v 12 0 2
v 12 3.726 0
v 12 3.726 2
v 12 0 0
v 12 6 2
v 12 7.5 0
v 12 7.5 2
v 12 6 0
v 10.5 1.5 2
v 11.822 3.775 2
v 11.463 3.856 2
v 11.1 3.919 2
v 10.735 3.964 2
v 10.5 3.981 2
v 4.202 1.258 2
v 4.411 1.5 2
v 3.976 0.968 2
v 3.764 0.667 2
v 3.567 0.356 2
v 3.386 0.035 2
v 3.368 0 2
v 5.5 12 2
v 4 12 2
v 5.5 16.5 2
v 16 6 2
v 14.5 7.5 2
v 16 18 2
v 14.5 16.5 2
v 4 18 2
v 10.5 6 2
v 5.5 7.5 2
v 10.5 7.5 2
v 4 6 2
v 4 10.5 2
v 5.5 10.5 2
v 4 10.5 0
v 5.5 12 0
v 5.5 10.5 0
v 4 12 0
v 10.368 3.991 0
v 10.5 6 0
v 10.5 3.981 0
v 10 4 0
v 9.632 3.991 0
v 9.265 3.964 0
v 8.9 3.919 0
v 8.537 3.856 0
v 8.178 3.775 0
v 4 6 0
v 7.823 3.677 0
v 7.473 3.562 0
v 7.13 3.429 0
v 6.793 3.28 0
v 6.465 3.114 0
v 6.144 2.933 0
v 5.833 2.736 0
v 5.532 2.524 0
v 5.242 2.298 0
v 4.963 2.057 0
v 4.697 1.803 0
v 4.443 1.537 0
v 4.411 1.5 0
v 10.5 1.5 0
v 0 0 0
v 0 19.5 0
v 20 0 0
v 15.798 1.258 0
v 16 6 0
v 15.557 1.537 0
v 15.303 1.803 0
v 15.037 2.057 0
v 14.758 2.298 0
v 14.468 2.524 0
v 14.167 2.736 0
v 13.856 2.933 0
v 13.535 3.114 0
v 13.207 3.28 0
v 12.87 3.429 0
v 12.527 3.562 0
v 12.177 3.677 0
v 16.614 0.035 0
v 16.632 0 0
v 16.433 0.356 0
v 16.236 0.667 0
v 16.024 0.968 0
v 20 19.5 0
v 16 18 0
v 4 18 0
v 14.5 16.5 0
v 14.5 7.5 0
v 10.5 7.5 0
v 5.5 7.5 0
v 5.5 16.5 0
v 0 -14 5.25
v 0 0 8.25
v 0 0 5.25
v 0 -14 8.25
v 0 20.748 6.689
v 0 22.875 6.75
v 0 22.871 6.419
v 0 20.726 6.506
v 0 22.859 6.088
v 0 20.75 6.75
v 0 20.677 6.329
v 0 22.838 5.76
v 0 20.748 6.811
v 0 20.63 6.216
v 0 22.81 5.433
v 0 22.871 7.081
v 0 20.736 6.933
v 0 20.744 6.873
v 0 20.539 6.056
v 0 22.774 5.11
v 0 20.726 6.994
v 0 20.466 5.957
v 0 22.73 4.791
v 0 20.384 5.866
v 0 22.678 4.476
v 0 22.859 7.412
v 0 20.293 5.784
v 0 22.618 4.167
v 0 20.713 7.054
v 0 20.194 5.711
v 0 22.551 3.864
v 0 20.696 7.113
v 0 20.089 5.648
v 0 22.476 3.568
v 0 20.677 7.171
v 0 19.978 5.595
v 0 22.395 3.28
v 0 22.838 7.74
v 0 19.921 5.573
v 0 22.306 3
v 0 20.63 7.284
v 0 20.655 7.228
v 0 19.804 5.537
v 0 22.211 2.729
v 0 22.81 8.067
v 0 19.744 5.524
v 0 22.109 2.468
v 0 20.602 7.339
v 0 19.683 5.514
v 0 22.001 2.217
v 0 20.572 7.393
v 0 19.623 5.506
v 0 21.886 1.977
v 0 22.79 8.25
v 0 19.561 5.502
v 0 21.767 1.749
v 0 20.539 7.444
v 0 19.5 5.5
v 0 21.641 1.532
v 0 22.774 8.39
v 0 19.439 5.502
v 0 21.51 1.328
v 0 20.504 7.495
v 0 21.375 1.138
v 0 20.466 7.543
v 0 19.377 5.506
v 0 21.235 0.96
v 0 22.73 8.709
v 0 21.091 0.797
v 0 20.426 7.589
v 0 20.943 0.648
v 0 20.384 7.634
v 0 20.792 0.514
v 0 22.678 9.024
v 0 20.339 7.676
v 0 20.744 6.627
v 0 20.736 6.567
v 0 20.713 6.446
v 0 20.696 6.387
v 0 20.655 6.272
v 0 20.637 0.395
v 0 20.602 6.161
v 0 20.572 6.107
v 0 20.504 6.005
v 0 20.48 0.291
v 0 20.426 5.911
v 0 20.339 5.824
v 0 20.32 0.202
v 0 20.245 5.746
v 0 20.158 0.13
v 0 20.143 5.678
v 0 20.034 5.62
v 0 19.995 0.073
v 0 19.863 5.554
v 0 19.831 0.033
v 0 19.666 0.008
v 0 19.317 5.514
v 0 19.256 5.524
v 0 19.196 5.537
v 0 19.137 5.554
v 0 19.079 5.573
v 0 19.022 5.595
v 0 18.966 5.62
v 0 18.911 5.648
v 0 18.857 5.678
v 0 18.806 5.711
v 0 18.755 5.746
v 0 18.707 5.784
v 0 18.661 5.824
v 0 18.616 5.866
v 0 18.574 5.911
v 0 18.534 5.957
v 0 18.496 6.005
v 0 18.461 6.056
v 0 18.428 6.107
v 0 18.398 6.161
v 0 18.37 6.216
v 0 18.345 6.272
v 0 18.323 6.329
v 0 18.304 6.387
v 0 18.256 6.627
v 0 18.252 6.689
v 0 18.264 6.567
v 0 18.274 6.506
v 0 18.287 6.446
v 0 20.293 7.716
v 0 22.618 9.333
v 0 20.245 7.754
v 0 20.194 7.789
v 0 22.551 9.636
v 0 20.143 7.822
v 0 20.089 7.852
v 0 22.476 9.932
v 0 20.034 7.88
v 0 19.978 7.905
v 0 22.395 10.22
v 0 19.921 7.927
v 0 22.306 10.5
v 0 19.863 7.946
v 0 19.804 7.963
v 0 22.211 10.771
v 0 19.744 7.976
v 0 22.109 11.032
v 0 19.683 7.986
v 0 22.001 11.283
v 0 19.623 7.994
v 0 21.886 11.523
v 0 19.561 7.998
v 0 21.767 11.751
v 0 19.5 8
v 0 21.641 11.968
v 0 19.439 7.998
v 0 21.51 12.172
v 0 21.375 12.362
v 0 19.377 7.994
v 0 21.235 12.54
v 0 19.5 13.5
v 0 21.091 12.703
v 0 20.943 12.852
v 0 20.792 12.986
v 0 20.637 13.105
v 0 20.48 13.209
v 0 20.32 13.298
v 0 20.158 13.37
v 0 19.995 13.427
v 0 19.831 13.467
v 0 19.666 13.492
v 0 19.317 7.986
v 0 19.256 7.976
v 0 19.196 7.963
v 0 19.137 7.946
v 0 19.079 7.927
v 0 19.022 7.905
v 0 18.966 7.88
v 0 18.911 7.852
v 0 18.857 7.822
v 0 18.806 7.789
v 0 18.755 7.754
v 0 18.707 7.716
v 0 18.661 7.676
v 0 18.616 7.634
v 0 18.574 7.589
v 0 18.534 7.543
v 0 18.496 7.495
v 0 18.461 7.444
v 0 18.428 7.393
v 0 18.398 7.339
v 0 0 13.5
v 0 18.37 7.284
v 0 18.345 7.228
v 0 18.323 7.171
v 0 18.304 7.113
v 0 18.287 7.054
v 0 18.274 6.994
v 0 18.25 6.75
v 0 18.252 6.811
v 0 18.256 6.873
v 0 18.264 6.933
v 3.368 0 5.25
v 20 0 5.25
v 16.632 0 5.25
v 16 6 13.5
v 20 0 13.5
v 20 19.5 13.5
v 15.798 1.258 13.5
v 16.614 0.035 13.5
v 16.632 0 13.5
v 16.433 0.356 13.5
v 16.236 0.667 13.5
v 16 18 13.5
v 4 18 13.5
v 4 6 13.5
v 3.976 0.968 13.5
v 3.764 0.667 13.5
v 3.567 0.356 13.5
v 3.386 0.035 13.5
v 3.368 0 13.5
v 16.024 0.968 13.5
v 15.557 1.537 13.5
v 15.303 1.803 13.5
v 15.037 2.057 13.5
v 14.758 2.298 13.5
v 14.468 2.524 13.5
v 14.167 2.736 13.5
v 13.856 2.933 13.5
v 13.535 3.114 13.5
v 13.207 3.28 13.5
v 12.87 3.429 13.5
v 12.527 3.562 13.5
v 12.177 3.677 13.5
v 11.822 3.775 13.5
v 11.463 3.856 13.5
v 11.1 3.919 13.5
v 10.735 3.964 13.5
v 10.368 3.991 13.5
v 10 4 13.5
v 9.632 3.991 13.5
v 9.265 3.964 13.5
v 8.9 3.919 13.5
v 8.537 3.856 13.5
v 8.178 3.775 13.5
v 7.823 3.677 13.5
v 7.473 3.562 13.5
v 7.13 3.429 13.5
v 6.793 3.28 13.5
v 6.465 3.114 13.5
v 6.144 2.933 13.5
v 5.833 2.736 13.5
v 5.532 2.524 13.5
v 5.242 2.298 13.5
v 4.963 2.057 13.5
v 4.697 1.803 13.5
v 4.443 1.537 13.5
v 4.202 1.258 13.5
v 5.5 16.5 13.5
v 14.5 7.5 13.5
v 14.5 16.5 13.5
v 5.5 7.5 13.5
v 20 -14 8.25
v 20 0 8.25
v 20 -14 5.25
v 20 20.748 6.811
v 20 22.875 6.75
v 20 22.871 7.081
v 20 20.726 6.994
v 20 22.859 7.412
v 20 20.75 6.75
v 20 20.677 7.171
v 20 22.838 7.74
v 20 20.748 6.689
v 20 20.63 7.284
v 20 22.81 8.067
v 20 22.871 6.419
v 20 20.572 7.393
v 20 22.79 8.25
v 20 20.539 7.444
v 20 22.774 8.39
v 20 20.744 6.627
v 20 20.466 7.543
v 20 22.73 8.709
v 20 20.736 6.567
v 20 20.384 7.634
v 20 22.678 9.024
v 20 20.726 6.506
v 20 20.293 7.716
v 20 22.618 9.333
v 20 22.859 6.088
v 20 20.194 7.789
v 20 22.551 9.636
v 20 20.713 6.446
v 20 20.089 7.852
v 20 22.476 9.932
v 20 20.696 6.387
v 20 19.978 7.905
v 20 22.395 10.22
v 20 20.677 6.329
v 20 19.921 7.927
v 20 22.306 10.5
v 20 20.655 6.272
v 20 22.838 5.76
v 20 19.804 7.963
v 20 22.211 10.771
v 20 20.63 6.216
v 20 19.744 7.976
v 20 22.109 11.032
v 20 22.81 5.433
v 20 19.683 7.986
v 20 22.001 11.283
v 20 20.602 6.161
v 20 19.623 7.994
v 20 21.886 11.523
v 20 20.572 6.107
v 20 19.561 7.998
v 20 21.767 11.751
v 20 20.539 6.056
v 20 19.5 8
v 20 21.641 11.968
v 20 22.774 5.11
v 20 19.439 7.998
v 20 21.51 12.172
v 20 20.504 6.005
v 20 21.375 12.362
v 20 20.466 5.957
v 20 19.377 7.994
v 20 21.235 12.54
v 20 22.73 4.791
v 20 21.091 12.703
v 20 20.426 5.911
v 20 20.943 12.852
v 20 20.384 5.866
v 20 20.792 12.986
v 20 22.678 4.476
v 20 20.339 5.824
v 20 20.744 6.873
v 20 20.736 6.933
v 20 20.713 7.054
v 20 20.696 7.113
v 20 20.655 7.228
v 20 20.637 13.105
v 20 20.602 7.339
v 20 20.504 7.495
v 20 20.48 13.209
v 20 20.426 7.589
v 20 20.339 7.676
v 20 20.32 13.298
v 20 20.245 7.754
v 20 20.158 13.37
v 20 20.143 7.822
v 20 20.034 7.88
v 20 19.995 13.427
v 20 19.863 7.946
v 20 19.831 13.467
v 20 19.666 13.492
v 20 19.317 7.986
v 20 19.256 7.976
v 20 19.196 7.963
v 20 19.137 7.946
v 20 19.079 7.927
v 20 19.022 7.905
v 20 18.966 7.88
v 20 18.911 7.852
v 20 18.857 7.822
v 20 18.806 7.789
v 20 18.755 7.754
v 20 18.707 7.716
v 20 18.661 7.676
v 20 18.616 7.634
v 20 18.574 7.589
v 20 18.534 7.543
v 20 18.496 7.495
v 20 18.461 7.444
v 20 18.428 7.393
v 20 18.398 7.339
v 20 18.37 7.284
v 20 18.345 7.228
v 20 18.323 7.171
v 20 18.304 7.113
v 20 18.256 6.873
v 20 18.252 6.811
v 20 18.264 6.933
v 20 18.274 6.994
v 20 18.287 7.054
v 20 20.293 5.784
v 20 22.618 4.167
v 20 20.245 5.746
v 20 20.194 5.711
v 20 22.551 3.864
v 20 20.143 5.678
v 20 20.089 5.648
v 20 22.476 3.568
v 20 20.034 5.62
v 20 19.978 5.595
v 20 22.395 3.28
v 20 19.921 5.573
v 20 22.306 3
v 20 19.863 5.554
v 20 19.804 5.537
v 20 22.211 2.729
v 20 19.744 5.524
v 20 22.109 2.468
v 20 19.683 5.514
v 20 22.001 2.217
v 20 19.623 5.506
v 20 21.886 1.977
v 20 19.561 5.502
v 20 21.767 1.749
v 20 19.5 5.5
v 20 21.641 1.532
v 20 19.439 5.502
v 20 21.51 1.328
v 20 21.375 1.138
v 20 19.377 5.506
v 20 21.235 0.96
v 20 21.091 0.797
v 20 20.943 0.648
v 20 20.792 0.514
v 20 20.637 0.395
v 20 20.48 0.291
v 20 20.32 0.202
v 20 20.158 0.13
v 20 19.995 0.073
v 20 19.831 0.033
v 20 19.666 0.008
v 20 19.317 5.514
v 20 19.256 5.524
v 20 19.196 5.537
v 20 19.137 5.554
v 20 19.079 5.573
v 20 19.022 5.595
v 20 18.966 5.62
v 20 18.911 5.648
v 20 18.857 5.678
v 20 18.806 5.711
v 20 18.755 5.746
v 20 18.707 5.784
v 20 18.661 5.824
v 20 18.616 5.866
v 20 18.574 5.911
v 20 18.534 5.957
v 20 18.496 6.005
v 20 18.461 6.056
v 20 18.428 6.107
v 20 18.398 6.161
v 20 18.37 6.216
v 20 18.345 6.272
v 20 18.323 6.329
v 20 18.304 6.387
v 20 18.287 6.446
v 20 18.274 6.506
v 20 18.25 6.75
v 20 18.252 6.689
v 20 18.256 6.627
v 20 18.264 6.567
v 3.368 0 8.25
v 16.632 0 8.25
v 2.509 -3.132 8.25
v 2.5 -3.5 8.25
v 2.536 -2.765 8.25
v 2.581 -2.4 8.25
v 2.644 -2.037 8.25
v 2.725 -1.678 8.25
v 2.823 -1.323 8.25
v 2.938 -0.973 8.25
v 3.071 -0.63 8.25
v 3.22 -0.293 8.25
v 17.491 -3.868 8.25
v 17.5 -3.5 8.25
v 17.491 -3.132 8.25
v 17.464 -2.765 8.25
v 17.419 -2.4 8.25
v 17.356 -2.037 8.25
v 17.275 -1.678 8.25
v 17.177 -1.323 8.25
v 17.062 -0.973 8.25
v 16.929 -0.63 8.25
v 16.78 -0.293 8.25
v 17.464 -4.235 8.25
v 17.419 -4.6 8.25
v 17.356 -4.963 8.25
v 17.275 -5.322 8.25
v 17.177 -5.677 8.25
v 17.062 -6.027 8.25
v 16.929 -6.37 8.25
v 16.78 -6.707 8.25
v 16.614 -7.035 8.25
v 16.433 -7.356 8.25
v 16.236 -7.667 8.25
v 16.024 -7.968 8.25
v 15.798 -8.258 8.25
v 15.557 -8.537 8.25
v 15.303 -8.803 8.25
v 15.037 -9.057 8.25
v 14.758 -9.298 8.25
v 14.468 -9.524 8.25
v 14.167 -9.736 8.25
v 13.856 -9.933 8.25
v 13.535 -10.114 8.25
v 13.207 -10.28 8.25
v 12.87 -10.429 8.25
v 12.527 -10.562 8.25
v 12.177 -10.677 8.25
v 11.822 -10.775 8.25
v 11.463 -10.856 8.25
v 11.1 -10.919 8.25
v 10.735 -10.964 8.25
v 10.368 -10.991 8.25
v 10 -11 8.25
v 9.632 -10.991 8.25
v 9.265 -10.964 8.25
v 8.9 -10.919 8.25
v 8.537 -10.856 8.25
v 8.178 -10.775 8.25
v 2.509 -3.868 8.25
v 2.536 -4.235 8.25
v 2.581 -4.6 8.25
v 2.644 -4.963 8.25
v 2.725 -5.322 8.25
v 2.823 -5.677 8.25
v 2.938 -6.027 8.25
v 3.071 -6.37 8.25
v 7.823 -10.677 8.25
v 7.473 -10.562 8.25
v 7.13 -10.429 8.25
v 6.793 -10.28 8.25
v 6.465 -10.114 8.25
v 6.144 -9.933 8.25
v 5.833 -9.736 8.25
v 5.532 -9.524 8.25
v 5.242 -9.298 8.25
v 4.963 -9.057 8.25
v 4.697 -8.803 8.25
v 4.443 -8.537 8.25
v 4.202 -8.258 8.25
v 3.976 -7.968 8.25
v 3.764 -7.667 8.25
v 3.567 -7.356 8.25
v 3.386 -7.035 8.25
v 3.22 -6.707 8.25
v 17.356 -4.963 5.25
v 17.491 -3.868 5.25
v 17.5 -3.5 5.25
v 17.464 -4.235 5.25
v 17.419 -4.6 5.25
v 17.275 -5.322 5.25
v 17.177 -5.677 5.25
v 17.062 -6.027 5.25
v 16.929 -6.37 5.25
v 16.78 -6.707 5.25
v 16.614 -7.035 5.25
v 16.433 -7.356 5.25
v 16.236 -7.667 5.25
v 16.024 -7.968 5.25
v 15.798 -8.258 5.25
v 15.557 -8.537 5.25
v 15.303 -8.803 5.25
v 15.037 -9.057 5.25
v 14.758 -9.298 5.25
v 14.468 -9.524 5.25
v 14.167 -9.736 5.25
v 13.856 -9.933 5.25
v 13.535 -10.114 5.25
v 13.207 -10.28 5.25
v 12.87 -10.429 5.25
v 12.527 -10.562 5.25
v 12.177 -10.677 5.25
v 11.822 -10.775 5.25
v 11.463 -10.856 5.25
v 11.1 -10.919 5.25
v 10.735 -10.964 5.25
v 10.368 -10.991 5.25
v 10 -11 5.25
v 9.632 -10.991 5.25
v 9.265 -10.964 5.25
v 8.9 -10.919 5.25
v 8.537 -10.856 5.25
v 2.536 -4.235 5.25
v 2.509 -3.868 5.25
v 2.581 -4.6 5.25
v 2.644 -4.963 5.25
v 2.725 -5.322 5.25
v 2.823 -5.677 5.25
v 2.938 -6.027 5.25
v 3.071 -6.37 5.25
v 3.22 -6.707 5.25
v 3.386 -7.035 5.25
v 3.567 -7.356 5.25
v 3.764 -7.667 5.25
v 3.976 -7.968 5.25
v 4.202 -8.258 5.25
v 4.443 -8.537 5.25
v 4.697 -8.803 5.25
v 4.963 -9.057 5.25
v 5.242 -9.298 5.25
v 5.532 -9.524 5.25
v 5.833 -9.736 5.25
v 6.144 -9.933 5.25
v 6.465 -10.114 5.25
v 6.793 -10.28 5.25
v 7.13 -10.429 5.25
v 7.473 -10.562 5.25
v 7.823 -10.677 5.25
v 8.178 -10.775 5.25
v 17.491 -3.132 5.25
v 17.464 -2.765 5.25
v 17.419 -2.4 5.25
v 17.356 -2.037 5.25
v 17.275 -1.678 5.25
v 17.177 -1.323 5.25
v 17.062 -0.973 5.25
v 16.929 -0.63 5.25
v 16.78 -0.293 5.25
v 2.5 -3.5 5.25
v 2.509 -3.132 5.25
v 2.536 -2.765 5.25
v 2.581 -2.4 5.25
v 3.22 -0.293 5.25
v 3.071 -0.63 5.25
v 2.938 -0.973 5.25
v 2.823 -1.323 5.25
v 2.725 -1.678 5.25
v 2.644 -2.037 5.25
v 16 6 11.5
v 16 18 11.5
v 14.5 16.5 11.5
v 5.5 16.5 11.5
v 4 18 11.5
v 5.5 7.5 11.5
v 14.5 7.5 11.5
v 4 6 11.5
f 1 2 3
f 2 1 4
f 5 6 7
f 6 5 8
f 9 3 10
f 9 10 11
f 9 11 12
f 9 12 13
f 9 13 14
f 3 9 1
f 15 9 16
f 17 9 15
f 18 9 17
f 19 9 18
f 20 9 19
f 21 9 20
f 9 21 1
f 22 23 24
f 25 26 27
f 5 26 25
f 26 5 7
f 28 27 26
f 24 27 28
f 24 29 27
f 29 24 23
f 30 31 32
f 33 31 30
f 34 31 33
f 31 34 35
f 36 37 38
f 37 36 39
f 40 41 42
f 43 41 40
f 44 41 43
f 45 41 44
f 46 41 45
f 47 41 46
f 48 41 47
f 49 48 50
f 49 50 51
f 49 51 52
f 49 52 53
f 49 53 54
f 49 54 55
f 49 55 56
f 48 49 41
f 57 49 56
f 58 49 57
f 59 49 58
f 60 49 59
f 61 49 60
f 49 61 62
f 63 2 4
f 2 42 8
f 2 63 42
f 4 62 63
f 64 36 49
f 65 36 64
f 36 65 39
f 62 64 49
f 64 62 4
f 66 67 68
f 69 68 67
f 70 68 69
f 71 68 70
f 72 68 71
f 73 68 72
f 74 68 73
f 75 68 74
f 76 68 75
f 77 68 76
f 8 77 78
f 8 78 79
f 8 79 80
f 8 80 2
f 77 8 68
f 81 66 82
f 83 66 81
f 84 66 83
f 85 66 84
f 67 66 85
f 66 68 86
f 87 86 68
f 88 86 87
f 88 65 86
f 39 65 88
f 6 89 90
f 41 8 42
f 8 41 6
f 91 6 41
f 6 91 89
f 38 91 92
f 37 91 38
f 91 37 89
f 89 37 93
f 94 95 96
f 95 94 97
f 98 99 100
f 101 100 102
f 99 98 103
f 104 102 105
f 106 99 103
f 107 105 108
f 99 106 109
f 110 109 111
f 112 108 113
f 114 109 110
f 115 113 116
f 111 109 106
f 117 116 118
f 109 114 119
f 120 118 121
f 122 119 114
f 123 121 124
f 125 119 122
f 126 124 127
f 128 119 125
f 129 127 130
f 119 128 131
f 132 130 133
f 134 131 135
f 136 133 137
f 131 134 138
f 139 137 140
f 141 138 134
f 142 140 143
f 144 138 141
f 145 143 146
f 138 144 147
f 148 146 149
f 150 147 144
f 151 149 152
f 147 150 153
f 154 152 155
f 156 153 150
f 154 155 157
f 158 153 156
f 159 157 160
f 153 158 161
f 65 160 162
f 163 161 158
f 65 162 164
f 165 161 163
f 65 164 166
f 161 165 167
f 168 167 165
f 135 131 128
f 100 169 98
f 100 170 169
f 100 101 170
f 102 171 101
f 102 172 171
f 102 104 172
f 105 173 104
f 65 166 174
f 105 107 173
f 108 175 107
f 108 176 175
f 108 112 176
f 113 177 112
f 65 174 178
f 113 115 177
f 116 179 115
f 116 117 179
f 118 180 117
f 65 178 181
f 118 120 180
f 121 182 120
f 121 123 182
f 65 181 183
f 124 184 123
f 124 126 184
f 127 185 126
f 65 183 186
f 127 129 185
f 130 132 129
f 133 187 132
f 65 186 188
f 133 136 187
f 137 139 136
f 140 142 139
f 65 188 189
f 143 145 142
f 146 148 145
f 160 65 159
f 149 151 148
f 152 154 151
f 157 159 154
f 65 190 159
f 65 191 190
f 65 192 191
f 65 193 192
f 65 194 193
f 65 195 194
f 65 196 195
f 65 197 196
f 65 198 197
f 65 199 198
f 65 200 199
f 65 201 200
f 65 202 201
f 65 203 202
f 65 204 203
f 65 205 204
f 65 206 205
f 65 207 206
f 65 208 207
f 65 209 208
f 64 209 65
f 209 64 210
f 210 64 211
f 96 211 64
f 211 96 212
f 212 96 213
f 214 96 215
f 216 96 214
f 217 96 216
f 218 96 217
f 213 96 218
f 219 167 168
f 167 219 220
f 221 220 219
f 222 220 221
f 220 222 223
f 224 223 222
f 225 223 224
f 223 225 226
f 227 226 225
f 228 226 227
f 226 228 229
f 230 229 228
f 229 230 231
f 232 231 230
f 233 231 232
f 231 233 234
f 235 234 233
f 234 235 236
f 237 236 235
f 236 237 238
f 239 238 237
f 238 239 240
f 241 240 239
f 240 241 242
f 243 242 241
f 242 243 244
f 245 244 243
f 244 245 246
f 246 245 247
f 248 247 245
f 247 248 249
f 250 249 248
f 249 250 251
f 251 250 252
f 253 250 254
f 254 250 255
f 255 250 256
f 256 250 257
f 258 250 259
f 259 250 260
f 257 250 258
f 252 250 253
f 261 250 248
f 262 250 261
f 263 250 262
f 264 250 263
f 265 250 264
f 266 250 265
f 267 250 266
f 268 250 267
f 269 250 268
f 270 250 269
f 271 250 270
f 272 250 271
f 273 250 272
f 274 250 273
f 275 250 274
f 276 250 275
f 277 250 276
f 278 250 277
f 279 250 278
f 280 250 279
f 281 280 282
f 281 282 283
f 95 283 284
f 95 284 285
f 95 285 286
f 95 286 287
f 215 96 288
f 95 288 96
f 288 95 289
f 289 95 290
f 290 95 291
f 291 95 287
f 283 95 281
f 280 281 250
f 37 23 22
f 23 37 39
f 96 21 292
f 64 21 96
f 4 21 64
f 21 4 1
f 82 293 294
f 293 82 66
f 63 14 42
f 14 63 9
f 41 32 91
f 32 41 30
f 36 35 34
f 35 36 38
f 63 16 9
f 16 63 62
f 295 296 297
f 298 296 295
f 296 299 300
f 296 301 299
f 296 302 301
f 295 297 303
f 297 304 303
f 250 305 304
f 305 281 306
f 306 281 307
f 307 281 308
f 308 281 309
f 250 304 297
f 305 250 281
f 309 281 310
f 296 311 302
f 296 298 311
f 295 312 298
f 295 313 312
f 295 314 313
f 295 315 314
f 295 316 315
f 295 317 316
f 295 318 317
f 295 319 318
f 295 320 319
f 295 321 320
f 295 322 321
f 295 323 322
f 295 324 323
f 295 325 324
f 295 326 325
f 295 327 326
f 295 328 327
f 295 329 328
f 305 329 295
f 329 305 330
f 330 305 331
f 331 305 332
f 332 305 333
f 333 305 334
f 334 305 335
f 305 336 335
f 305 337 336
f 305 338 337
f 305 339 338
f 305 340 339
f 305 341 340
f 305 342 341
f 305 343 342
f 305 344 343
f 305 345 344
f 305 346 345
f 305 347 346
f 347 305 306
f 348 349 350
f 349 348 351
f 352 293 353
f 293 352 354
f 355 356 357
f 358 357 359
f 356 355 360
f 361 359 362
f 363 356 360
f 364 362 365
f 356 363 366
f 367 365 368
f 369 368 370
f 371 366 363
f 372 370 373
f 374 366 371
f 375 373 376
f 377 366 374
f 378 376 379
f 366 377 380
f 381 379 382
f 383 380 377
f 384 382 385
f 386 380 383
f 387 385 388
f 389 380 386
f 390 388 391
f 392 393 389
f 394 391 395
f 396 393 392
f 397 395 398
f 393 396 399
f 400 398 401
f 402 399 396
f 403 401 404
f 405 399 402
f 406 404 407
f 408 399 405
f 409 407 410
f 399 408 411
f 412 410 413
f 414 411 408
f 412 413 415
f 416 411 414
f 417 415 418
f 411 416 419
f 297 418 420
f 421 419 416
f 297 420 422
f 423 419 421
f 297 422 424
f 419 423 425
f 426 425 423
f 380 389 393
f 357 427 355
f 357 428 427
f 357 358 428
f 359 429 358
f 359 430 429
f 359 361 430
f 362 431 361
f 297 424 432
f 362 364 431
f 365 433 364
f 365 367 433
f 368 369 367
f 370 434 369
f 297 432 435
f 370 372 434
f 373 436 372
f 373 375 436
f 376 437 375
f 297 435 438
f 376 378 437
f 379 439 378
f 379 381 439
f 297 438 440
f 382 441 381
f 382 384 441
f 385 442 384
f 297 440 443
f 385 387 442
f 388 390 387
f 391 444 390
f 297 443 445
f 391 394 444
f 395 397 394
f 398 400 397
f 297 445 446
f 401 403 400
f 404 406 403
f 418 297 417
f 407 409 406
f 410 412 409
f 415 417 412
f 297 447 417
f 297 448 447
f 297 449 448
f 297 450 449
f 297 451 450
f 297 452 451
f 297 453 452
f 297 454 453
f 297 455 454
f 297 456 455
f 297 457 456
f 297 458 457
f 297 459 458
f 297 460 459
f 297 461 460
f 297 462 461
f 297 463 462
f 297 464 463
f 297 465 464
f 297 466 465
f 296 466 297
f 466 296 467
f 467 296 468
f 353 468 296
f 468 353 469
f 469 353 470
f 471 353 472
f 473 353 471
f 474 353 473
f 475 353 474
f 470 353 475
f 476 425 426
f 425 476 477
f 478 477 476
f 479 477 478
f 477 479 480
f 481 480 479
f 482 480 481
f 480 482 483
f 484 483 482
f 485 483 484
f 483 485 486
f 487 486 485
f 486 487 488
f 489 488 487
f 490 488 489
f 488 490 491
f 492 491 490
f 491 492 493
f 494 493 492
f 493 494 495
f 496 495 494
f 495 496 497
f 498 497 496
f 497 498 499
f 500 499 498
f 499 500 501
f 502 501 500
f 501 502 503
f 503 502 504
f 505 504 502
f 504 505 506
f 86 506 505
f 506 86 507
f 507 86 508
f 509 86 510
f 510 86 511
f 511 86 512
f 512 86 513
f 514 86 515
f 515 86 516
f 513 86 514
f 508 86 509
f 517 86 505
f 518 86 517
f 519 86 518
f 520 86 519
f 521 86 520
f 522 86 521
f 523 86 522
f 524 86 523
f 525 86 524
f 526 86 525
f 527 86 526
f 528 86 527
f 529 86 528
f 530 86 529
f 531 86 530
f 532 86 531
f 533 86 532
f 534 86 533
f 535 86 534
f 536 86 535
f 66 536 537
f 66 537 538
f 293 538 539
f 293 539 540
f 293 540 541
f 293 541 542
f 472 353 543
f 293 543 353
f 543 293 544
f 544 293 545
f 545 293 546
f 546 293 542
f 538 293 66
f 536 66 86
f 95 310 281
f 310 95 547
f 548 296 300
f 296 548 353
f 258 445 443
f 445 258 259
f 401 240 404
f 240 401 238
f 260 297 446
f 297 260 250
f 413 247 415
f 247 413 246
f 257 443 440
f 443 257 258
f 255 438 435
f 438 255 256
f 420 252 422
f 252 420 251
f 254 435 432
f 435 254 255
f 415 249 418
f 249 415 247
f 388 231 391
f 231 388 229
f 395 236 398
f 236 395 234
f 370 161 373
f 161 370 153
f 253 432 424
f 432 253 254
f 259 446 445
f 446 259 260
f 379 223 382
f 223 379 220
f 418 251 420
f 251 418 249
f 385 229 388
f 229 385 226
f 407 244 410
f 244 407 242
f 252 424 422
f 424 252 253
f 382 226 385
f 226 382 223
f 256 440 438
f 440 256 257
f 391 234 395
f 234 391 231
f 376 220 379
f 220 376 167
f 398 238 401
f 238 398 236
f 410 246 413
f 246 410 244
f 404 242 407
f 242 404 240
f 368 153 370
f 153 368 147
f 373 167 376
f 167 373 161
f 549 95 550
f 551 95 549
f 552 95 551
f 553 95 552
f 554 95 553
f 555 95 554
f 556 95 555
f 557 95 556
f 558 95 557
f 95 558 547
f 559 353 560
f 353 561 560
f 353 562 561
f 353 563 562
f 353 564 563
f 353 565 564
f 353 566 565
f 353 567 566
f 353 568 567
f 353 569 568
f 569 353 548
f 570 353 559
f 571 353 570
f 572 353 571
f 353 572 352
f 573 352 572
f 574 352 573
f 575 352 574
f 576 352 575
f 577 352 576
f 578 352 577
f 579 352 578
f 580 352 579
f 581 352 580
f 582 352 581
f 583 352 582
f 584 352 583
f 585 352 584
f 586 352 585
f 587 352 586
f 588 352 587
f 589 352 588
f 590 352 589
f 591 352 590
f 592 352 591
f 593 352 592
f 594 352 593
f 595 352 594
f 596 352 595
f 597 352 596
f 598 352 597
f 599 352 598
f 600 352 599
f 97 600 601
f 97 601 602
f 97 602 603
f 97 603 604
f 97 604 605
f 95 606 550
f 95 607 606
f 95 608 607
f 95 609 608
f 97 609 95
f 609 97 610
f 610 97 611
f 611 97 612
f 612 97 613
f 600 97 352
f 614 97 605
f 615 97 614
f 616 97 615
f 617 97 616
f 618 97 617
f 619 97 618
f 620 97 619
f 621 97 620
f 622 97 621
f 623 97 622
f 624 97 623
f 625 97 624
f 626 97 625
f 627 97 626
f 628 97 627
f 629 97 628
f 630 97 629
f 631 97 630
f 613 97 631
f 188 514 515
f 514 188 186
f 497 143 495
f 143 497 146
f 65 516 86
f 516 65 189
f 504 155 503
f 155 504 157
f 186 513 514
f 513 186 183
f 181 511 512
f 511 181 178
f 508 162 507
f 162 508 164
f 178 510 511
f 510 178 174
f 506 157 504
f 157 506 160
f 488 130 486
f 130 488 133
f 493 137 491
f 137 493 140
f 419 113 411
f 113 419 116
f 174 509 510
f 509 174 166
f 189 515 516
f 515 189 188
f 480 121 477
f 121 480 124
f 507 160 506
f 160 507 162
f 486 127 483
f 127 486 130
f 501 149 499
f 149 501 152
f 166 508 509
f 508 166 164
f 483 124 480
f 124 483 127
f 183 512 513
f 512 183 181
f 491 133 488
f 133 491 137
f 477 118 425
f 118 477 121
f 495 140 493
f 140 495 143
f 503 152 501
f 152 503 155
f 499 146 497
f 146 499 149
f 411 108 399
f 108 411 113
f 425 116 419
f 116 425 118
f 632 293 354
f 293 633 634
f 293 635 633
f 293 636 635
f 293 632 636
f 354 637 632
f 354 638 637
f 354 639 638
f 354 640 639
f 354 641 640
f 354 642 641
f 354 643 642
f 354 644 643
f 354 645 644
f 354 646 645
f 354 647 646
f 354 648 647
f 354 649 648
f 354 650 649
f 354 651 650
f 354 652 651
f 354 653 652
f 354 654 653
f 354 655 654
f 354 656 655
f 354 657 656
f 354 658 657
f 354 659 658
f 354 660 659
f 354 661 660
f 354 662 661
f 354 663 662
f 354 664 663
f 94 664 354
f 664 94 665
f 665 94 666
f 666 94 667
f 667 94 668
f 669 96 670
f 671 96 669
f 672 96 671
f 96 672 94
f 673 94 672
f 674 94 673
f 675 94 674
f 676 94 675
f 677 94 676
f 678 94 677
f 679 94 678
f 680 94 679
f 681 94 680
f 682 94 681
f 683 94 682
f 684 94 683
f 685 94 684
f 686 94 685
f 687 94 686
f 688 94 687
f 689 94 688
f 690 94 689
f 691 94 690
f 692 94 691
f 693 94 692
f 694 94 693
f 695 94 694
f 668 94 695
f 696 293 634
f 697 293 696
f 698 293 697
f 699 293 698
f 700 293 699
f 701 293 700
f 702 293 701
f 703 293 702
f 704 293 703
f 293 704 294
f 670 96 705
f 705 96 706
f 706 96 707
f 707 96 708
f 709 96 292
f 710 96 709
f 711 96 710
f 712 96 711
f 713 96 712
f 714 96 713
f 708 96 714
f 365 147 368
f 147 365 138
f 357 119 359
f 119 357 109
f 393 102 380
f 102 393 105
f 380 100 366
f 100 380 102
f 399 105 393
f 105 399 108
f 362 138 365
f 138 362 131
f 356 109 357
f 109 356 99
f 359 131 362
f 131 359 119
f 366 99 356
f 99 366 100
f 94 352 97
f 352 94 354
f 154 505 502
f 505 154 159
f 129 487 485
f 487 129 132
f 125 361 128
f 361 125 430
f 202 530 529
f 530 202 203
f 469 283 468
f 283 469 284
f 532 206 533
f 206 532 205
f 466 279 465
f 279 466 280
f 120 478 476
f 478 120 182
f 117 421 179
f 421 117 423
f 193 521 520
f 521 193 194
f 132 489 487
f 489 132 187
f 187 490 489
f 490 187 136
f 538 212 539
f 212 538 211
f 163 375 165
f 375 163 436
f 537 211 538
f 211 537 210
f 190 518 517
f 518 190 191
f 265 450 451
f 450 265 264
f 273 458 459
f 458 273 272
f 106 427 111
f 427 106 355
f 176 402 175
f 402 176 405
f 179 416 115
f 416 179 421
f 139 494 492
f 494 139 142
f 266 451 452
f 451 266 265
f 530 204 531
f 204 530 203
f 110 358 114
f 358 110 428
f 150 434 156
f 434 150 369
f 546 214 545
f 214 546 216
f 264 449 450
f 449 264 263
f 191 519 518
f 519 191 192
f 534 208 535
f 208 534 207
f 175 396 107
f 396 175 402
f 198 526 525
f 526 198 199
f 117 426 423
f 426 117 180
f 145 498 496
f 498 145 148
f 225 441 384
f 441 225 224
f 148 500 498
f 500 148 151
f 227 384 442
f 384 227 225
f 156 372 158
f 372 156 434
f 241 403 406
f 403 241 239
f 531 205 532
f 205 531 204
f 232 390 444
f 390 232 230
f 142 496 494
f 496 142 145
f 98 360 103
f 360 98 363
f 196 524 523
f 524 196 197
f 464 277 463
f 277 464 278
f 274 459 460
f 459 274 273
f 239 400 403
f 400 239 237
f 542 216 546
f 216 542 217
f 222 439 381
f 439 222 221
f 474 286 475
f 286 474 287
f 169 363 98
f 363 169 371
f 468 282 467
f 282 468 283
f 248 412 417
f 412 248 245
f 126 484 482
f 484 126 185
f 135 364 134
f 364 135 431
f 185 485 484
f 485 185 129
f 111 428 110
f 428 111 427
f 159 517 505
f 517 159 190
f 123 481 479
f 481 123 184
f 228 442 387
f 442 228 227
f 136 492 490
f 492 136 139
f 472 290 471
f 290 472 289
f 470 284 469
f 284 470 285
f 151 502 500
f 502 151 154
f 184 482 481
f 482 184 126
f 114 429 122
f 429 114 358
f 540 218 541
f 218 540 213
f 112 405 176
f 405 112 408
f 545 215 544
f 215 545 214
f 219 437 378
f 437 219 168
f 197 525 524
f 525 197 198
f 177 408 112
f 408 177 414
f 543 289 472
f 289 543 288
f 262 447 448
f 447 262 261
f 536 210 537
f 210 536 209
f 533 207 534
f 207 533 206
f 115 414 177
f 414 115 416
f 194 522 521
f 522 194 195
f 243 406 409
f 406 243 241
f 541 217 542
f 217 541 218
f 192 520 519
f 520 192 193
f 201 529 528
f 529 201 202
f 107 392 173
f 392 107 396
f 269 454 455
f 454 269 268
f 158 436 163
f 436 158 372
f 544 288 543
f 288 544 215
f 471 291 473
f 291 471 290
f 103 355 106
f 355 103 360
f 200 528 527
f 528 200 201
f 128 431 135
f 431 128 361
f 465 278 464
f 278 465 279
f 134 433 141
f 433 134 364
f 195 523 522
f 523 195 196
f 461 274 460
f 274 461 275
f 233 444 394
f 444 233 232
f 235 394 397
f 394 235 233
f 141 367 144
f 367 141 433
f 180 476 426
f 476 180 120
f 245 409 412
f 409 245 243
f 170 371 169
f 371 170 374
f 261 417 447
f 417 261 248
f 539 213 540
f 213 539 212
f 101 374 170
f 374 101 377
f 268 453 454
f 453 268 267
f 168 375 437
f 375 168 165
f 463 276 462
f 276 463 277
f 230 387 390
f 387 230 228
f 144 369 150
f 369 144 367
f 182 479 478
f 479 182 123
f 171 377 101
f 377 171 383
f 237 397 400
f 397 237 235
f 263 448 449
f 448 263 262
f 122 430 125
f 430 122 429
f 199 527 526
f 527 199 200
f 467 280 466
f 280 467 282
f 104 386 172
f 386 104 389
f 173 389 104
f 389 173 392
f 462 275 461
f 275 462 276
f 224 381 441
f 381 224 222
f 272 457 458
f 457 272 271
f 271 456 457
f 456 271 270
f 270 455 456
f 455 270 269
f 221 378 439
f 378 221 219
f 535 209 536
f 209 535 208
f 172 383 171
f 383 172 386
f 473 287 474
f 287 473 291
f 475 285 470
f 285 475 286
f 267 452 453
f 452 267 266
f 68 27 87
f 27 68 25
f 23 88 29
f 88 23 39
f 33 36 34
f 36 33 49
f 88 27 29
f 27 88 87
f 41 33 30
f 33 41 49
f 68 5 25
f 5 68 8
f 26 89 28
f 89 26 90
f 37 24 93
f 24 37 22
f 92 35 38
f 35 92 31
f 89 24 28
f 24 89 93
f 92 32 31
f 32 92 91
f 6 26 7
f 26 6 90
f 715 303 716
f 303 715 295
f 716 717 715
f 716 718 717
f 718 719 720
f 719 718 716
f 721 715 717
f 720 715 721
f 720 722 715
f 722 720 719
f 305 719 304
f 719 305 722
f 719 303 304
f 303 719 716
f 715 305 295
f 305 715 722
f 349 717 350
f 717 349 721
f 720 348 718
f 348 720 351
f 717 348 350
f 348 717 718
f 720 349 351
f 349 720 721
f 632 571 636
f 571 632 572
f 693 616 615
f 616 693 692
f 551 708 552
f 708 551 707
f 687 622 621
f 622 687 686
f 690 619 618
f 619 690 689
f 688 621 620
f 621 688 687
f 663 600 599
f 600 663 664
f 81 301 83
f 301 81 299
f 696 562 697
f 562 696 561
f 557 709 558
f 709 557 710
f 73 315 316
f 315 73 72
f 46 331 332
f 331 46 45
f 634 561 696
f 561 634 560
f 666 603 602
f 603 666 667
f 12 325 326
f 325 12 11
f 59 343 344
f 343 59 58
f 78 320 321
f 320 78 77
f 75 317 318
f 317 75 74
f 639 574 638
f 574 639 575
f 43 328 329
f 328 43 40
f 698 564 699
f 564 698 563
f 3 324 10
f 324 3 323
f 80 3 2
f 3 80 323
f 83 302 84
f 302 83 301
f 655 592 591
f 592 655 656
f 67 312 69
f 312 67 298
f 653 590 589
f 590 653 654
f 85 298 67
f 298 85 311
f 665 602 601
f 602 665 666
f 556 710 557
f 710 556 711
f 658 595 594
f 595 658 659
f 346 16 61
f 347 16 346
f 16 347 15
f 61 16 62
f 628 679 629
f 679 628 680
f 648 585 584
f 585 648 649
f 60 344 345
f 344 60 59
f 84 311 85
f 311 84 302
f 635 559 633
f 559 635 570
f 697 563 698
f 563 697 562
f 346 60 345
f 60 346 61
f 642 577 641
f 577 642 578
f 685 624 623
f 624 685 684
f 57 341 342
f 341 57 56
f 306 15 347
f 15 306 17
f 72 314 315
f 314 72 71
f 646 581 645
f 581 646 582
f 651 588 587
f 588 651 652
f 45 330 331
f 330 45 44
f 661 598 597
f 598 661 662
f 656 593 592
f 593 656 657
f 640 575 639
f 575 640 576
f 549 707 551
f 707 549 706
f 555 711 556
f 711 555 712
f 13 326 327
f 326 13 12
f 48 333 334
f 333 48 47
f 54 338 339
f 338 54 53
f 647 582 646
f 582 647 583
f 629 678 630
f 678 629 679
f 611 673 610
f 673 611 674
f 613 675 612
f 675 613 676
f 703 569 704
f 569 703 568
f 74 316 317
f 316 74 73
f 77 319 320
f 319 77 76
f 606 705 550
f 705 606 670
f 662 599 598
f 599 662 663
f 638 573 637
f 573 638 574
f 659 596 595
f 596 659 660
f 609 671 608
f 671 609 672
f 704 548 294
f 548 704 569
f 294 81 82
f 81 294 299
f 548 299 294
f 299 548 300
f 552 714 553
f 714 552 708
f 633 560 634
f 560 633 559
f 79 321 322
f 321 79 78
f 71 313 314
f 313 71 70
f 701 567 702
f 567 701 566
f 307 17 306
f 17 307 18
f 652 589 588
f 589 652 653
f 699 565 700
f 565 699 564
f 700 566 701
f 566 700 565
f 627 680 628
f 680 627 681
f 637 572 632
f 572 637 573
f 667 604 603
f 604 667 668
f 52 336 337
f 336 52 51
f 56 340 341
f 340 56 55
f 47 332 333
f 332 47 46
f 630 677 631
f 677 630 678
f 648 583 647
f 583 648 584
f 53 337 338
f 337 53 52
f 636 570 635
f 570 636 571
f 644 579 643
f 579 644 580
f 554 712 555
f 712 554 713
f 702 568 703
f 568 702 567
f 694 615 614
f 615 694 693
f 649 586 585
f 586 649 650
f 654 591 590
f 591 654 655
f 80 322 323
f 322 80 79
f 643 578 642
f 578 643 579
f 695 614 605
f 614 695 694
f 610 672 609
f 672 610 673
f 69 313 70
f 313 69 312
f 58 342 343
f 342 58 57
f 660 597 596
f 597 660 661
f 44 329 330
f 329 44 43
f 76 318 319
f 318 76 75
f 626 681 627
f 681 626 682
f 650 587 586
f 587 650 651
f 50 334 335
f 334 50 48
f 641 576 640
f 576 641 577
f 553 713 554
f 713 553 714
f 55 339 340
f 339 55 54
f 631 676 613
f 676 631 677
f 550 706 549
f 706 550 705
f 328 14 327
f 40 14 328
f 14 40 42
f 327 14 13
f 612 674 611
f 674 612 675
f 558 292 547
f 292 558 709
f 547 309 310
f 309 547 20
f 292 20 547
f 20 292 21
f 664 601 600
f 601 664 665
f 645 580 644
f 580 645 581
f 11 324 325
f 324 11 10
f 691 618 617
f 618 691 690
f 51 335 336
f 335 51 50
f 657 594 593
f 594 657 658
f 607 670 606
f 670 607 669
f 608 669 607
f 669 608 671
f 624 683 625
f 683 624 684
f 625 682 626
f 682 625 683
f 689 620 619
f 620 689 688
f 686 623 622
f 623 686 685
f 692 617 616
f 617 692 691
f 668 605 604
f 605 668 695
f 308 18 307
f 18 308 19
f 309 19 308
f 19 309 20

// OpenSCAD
// file: ../config/colors.scad
/* RailEduKit/InteractiveSignallingLaboratory © 2025 by Martin Scheidt and contributors
 * License: CC-BY 4.0 - https://creativecommons.org/licenses/by/4.0/
 * Project description: The Interactive Signalling Laboratory is a tool for training in Rail
 * Applications to enhance the knowledge of control and signalling principles for rail transport systems.
 *
 * Module: config/colors.scad
 */

// component colors
BASE_COLOR = [0.25, 0.25, 0.25];// lighter black to see the shapes
INDICATOR_COLOR = "white";
ROUTE_COLOR = "blue";

METALLIC_GREY = [0.474, 0.482, 0.482];



// signal colors
ASPECT_CLEAR = "green";
ASPECT_APPROACH = "yellow";
ASPECT_STOP = "red";
// file: ../parts/signal_symbols.scad
/* RailEduKit/InteractiveSignallingLaboratory © 2025 by Martin Scheidt and contributors
 * License: CC-BY 4.0 - https://creativecommons.org/licenses/by/4.0/
 * Project description: The Interactive Signalling Laboratory is a tool for training in Rail
 * Applications to enhance the knowledge of control and signalling principles for rail transport systems.
 *
 * Module: signal_symbol
 */

 // Include configuration file
include <../config/global_variables.scad>

module symbol_block() {
	difference() {
		cube([ signal_symbol_size, signal_symbol_size, engraving_height ]);
		translate([ engraving_thickness, engraving_thickness, 0 ])
		cube([
			signal_symbol_size - 2 * engraving_thickness, signal_symbol_size - 2 * engraving_thickness,
			engraving_height
		]);
	}
}

symbol_block();
// file: ../parts/signal_lever.scad
/* RailEduKit/InteractiveSignallingLaboratory © 2025 by Martin Scheidt and contributors
 * License: CC-BY 4.0 - https://creativecommons.org/licenses/by/4.0/
 * Project description: The Interactive Signalling Laboratory is a tool for training in Rail
 * Applications to enhance the knowledge of control and signalling principles for rail transport systems.
 *
 * Module: component/signal_lever
 */

// Include configuration file
include <../config/global_variables.scad>
include <../config/colors.scad>


module signal_lever(top_color = ASPECT_CLEAR, bottom_color = ASPECT_STOP) {
	module handle() {
		union() {
			intersection() {
				translate([ 0, handle_depth, (block_height - handle_height) / 2 ])
				color(BASE_COLOR) cube([ block_width, handle_depth, handle_height ]);
				translate([ 0, block_depth, block_height / 2 ])
				color(BASE_COLOR) scale([ 1, 0.5, 1 ]) rotate([ 0, 90, 0 ])
				cylinder(h = block_width, r = block_height / 2);
			}
			translate([ 0, -handle_depth, (block_height - handle_height) / 2 ])
			color(BASE_COLOR) cube([ block_width, handle_depth + block_depth, handle_height ]);
		}
	}
	module rotation_axis() {
		translate([ 0, block_depth, block_height / 2 ])
		rotate([ 0, 90, 0 ])
		cylinder(h = block_width, d = axis_diameter + move_tolerance);
	}
	module signal_aspect(color_aspect) {
		difference() {
			union() {
				color(color_aspect) cube([ block_width, block_depth, block_height / 2 ]);

				translate([ 0, block_depth, block_height / 2 ])
				scale([ 1, 0.5, 1 ]) rotate([ 0, 90, 0 ])
				color(color_aspect) cylinder(h = block_width, r = block_height / 2);
			}
			translate([ -1, 0, block_height / 2 - handle_height / 2 ])
			color(color_aspect) cube([ block_width + 2, block_depth + block_width, block_height / 2 + handle_height ]);
			// color border line
			// translate([0,0,(block_height-handle_height)/2-fine_line]) color(BASE_COLOR) cube([fine_line, 2*block_depth,
			// fine_line]); translate([0,0,(block_height+handle_height)/2]) color(BASE_COLOR) cube([fine_line,
			// 2*block_depth, fine_line]);
		}
	}

	difference() {
		union() {
			translate([ block_width, 0, block_height ])
			rotate([ 0, 180, 0 ])
			signal_aspect(top_color);
			signal_aspect(bottom_color);
			handle();
		}
		rotation_axis();
	}
}

module lever_space_cubes() {
	translate([ wall_thickness_x, 0, z_pos_axis - (handle_height) / 2 - move_tolerance ])
	cube([
		body_width - 2 * wall_thickness_x, wall_thickness_y,
		body_height
	]); // z=wall_thickness_z+(arrow_block_height-handle_height)/2
	translate([ wall_thickness_x, body_depth - wall_thickness_y, z_pos_axis - (handle_height) / 2 - move_tolerance ])
	cube([ body_width - 2 * wall_thickness_x, wall_thickness_y, body_height ]);
}
// main file
/* RailEduKit/InteractiveSignallingLaboratory © 2025 by Martin Scheidt and contributors
 * License: CC-BY 4.0 - https://creativecommons.org/licenses/by/4.0/
 * Project description: The Interactive Signalling Laboratory is a tool for training in Rail
 * Applications to enhance the knowledge of control and signalling principles for rail transport systems.
 *
 * Module: signal_lever_block
 */

// Include configuration file
include <../config/global_variables.scad>

// include common parts
include <../parts/signal_lever.scad>
include <../parts/signal_symbols.scad>

module signal_lever_block() {
	difference() {
		signal_lever();
		// locker pin hole
		translate([ block_width / 2, -wall_thickness_y / 2 - 3 * move_tolerance, 0 ])
		cylinder(h = locker_height, d = locker_width + 2 * move_tolerance);
	
		// symbol
		translate([ signal_symbol_side_space, 4 * (block_depth - signal_symbol_size) / 5, 0 ])
		symbol_block();
		translate([ signal_symbol_side_space, 4 * (block_depth - signal_symbol_size) / 5, block_height - engraving_height ])
		symbol_block();
	}
}

signal_lever_block();
